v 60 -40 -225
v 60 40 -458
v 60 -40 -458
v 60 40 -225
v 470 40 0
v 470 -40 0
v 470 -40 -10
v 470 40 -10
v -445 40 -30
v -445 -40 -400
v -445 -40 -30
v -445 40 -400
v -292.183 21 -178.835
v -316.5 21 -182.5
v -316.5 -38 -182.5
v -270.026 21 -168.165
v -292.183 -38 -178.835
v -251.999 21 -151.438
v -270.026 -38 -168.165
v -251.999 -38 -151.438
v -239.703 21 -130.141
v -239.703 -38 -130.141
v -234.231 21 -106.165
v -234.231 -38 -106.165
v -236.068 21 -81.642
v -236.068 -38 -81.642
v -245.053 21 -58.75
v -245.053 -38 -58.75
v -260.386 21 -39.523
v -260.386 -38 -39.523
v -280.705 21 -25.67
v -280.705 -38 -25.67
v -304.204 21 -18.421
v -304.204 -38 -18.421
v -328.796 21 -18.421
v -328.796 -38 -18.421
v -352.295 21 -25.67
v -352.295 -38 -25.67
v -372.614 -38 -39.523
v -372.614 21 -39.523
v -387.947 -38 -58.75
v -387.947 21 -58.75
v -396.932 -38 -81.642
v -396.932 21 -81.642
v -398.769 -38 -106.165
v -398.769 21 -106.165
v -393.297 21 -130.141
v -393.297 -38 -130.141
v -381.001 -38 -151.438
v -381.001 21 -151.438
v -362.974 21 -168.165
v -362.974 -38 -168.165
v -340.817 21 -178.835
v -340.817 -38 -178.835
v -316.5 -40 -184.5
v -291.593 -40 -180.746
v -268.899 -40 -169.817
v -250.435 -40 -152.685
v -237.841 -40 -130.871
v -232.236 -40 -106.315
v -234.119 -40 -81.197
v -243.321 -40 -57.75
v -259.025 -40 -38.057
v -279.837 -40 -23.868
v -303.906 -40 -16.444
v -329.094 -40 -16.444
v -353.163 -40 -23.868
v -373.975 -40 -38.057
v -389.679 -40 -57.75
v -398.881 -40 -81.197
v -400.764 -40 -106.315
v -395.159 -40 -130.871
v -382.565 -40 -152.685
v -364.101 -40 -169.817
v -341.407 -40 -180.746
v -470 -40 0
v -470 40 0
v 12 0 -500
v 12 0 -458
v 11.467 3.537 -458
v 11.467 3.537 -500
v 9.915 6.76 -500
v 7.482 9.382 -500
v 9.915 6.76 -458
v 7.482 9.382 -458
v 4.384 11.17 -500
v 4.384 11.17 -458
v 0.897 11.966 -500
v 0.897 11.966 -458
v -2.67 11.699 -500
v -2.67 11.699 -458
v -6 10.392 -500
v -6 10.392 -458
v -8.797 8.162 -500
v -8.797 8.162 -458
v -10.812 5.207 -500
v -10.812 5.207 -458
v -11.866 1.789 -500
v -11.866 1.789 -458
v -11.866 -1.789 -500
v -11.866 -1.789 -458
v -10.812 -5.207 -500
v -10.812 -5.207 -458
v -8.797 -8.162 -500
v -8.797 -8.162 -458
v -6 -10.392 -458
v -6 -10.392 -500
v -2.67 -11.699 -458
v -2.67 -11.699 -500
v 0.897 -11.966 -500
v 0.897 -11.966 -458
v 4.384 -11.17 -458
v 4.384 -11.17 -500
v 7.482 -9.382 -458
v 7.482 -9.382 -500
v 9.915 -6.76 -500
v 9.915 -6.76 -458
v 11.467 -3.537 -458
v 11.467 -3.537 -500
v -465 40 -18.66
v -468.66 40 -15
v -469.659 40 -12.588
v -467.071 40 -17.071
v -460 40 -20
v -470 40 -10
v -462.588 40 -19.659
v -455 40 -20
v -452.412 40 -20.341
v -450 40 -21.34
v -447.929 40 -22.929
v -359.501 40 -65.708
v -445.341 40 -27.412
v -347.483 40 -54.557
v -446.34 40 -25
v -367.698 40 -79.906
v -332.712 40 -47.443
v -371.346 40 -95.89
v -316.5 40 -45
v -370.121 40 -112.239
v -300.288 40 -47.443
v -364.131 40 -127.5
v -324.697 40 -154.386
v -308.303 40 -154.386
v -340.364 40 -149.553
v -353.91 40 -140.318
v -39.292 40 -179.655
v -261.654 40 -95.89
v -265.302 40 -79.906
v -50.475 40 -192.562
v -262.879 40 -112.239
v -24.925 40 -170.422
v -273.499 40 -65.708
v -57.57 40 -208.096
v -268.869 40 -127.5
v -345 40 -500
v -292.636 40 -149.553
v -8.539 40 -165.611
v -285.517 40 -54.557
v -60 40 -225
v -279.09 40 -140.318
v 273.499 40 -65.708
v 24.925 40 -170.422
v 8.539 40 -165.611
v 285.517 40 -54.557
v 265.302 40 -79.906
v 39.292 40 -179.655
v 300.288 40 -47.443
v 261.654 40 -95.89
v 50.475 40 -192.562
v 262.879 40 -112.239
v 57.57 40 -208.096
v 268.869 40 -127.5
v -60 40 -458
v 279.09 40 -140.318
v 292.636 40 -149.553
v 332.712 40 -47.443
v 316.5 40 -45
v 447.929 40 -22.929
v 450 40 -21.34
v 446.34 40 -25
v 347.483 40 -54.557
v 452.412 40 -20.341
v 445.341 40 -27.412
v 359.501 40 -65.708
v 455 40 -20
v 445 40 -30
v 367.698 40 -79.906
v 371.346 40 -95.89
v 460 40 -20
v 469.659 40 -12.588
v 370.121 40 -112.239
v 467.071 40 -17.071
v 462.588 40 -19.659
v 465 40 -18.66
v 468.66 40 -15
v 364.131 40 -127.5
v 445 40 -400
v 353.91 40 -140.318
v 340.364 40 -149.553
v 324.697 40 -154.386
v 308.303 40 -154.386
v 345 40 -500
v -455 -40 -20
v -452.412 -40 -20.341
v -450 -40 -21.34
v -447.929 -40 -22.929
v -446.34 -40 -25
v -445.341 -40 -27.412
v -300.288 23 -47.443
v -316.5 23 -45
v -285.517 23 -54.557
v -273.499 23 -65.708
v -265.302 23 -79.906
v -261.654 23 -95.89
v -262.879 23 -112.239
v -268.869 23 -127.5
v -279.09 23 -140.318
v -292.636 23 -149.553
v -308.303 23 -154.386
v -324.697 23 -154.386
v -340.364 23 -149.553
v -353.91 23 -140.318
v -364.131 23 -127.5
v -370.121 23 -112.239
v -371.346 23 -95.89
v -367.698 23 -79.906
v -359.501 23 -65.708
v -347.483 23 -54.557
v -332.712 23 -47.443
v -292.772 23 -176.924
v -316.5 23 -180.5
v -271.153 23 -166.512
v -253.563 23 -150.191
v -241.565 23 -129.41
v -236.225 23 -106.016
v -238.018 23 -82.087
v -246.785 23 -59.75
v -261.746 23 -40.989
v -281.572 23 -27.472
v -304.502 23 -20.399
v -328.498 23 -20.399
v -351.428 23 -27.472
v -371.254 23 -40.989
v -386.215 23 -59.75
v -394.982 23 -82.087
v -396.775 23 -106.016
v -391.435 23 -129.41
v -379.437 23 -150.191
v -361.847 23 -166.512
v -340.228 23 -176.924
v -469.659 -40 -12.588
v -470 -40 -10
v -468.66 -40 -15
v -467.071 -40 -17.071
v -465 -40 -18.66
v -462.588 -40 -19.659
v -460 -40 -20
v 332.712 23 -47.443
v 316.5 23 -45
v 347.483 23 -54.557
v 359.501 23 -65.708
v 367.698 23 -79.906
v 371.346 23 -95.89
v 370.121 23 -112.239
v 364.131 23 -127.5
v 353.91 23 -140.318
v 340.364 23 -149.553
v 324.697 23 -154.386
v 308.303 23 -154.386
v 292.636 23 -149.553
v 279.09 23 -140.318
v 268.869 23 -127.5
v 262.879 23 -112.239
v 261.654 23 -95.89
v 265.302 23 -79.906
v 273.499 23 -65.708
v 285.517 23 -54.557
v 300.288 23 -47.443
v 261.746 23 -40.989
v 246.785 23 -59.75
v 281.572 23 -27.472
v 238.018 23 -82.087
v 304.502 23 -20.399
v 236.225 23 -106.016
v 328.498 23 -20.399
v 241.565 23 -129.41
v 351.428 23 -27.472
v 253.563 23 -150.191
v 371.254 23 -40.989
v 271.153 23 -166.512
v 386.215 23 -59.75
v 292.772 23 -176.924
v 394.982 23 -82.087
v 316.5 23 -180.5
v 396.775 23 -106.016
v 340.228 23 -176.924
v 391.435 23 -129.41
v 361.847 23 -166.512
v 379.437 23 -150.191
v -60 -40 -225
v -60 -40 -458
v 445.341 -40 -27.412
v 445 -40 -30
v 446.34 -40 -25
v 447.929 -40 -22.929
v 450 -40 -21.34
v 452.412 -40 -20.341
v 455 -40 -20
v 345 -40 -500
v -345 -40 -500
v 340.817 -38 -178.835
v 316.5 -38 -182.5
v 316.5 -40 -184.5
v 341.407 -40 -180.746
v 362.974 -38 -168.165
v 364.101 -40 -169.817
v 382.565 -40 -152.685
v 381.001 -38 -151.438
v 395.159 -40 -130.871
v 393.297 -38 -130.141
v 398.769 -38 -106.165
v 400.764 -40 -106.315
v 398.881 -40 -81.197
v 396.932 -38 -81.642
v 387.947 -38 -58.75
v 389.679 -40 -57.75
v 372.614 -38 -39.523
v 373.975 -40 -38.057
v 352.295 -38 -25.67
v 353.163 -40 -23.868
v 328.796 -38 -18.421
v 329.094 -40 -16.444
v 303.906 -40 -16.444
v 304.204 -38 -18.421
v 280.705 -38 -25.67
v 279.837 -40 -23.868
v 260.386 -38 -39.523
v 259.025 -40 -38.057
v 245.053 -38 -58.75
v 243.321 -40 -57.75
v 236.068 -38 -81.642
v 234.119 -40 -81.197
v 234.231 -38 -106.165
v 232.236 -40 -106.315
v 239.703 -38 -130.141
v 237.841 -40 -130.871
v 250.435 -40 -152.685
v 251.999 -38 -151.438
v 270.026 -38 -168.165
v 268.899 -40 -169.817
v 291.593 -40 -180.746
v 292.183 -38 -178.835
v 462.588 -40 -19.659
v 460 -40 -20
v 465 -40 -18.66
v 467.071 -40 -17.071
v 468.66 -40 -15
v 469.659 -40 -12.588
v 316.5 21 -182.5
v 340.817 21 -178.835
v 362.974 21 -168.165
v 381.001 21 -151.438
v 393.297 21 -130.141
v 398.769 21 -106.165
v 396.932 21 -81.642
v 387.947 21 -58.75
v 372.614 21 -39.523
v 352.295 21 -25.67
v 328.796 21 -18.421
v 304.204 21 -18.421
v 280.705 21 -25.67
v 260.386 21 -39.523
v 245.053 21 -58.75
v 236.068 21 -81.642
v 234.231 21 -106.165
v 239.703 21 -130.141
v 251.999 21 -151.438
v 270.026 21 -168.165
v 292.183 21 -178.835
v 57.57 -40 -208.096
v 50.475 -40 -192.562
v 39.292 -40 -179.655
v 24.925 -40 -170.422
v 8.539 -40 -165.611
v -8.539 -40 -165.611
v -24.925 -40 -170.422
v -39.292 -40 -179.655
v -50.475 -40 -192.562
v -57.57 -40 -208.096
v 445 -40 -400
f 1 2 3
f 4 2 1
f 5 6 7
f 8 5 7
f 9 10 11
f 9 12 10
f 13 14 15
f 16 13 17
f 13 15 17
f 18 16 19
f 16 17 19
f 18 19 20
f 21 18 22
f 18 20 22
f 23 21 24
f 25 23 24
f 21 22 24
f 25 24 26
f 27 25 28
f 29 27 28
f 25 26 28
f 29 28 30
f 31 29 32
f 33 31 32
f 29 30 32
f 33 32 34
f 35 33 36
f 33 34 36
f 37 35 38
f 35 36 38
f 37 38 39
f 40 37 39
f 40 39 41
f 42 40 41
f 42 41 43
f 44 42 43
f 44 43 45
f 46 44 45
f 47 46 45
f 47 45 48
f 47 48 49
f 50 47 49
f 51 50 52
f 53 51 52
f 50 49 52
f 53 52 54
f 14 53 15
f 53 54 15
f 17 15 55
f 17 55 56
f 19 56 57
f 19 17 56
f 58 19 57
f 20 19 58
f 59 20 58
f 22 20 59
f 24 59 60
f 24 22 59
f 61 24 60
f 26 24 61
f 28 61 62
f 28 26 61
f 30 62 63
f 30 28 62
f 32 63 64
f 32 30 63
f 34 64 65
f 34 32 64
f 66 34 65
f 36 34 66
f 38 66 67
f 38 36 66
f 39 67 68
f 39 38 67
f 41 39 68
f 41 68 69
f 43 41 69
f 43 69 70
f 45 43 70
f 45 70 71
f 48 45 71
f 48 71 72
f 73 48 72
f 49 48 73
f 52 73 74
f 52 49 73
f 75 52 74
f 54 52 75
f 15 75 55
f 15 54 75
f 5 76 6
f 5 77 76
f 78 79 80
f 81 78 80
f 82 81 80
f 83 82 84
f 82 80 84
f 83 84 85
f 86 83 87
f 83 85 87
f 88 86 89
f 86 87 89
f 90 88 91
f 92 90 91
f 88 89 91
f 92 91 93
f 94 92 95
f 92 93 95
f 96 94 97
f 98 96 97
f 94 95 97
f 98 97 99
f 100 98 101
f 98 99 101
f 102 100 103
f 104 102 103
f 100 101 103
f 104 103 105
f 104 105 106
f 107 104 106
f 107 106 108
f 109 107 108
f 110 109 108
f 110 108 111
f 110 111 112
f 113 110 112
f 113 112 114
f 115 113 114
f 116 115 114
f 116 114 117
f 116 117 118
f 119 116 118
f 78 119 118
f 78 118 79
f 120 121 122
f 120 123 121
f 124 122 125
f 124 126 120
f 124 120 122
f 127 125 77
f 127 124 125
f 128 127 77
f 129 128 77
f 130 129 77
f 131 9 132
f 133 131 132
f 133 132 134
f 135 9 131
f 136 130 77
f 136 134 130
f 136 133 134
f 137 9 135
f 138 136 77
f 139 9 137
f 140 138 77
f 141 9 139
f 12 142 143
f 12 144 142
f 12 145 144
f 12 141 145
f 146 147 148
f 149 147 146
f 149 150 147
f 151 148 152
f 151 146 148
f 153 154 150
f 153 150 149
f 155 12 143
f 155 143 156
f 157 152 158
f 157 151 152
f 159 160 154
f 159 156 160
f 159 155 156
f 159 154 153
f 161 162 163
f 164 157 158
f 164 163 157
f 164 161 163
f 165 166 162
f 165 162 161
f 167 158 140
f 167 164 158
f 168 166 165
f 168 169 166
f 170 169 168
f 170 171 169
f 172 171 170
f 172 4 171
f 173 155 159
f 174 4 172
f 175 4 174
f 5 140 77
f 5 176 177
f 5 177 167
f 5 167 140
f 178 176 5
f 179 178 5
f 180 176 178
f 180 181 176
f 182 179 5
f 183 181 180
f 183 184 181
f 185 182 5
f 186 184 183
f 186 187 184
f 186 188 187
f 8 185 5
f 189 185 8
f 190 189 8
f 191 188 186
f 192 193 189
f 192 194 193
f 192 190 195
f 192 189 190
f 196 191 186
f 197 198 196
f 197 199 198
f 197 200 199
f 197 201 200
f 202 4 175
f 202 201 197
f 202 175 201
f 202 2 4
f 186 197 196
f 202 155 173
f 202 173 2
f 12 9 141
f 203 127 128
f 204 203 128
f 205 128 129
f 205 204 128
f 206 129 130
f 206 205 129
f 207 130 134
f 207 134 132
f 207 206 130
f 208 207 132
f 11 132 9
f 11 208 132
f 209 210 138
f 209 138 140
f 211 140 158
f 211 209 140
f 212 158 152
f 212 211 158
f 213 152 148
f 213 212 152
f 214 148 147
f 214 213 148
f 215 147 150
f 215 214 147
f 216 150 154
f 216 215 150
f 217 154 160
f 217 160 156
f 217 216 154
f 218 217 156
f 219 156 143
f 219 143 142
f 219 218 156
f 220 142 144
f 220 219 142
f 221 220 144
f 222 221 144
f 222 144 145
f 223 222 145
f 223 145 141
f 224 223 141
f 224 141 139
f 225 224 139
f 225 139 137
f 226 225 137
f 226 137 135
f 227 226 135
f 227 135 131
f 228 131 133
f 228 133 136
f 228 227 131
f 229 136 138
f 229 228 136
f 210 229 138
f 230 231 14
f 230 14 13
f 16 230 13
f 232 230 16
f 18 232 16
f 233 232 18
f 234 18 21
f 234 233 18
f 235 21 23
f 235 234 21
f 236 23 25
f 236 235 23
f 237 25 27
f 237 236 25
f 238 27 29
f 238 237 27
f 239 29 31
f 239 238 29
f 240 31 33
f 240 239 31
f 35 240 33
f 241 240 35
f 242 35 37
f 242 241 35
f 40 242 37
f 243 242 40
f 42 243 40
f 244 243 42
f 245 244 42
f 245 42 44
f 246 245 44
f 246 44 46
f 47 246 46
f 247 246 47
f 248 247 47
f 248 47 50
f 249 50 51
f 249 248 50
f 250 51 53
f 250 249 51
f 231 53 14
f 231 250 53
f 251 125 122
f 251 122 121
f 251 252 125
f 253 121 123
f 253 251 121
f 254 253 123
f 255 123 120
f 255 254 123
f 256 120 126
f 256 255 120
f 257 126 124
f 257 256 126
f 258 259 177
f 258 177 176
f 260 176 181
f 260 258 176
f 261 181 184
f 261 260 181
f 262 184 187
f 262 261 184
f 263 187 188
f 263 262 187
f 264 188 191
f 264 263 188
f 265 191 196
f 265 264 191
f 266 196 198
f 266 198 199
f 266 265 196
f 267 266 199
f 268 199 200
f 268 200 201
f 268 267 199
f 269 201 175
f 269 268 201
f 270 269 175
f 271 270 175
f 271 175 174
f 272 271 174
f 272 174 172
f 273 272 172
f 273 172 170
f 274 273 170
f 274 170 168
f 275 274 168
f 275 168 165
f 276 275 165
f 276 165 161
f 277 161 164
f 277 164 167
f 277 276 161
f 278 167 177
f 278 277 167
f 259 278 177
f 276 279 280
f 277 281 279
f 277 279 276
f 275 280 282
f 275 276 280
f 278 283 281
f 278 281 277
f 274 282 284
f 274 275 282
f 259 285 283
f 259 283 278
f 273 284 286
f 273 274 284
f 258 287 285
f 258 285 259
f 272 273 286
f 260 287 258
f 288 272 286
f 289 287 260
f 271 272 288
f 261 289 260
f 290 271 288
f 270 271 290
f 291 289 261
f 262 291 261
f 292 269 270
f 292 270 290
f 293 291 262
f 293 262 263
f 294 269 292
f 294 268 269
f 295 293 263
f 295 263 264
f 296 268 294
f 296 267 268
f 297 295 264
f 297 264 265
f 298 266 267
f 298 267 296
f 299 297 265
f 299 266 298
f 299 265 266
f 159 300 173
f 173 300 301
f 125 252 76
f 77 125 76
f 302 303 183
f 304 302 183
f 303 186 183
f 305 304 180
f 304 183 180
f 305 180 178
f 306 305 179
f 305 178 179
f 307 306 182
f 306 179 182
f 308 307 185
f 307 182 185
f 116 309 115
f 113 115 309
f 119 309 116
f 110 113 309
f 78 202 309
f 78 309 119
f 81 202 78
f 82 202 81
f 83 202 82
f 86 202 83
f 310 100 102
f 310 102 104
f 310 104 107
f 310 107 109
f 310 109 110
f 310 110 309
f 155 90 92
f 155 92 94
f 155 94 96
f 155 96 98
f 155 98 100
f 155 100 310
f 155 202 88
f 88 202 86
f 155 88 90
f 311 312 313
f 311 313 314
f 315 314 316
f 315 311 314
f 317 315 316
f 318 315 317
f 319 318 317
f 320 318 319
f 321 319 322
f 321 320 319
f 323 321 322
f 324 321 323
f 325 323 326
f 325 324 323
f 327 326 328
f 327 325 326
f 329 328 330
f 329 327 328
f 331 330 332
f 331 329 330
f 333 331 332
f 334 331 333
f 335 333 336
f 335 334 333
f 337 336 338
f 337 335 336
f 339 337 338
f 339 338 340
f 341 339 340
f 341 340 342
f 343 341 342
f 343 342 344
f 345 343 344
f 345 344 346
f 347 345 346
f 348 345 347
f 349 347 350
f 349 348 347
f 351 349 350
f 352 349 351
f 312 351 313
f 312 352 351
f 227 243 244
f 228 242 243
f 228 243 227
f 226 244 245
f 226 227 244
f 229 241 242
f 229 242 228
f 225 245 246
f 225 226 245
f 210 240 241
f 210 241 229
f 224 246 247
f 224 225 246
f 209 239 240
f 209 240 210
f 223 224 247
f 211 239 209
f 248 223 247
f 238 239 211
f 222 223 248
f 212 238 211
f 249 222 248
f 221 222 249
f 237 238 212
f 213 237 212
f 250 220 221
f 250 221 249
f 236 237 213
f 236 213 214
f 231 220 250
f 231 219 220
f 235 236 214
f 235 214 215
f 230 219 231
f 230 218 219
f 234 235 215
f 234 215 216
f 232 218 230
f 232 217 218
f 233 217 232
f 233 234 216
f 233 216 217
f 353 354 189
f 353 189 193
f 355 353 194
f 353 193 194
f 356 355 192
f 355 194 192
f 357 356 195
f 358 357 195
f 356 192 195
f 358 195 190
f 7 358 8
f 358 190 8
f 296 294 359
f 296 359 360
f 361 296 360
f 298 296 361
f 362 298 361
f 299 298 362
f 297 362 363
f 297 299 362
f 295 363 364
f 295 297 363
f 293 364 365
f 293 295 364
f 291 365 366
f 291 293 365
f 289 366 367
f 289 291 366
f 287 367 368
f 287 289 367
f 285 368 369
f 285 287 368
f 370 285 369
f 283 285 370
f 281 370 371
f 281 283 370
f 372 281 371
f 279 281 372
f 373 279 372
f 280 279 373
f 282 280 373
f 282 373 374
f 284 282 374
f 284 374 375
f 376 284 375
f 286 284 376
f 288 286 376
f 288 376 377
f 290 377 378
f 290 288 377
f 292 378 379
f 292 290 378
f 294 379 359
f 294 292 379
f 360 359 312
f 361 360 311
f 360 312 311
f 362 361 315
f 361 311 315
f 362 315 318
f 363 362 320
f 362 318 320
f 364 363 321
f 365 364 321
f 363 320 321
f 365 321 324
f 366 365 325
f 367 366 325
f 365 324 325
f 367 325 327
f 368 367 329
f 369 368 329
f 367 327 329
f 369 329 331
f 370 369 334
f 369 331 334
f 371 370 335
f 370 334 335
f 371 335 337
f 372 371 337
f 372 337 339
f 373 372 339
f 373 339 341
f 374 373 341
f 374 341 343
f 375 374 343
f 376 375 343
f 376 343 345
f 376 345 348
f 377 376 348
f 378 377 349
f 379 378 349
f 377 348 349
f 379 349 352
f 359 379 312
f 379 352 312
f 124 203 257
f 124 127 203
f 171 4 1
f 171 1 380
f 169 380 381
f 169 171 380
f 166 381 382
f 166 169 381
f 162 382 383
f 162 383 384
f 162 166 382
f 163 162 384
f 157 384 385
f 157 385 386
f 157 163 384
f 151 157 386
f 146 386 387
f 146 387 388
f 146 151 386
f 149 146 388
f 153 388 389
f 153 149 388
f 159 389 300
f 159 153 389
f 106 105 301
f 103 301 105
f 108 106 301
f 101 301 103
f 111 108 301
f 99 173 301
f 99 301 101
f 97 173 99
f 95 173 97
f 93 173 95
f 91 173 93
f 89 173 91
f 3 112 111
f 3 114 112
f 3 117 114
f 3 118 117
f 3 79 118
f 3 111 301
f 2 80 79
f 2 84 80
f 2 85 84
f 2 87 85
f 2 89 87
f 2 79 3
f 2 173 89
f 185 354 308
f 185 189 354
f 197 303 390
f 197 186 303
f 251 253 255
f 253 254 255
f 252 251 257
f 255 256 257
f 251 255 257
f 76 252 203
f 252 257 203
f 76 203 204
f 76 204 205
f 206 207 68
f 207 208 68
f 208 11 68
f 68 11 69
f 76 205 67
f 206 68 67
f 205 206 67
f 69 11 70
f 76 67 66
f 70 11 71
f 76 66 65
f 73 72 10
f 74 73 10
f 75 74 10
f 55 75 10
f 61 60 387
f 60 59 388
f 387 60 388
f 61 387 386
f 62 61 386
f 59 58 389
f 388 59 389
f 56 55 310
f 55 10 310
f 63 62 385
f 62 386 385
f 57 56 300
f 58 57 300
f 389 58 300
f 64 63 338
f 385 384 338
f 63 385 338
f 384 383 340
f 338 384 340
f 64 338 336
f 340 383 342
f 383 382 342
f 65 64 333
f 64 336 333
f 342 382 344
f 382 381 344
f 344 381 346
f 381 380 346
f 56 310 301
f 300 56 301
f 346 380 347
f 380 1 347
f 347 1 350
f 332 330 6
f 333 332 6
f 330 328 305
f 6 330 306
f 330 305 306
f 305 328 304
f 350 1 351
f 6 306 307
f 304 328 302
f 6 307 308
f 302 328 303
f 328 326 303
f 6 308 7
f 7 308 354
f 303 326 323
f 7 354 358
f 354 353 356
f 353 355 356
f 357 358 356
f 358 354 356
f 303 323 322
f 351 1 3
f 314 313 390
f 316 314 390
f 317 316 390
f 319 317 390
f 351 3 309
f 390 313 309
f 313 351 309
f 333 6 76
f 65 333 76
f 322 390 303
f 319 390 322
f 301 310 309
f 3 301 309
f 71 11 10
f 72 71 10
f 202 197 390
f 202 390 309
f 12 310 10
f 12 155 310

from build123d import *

# Parameters (mm, degrees)
SKETCH1_R           = 55
BOSS_EXTRUDE1_DEPTH = 40
FILLET1_R           = 10
SKETCH2_R           = 12
CUT_EXTRUDE1_DEPTH  = 80
SKETCH3_R           = 82.5
CUT_EXTRUDE2_DEPTH  = 63
CHAMFER1_SIZE       = 2


with BuildPart() as part:
    # Sketch1 → Boss-Extrude1 (new, symmetric)
    with BuildSketch(Plane(origin=(0, 0, 0), x_dir=(1, 0, 0), z_dir=(0, 1, 0))):
        Polygon((-470, 0), (-445, 0), (445, 0), (470, 0), (470, 20), (445, 20), (445, 400), (345, 500), (-345, 500), (-445, 400), (-445, 20), (-470, 20), align=None)
        with Locations(Location((-316.5, 100, 0), (0, 0, 270))):
            Circle(SKETCH1_R, mode=Mode.SUBTRACT)
        with Locations(Location((316.5, 100, 0), (0, 0, 270))):
            Circle(SKETCH1_R, mode=Mode.SUBTRACT)
        with BuildLine():
            Line((-60, 225), (-60, 458))
            Line((-60, 458), (60, 458))
            Line((60, 458), (60, 225))
            ThreePointArc((60, 225), (0, 165), (-60, 225))
        make_face(mode=Mode.SUBTRACT)
    extrude(amount=BOSS_EXTRUDE1_DEPTH, both=True)

    # Fillet1
    fillet1_edges = [part.edges().sort_by_distance(p)[0] for p in [
        (445, 0, -20),
        (470, 0, -20),
        (-470, 0, -20),
        (-445, 0, -20),
    ]]
    fillet(fillet1_edges, radius=FILLET1_R)

    # Sketch2 → Cut-Extrude1 (cut)
    with BuildSketch(Plane.XY.offset(-458)):
        Circle(SKETCH2_R)
    extrude(amount=-CUT_EXTRUDE1_DEPTH, mode=Mode.SUBTRACT)

    # Sketch3 → Cut-Extrude2 (cut)
    with BuildSketch(Plane.XZ.offset(40)):
        with Locations(Location((-316.5, -100, 0), (0, 0, 270))):
            Circle(SKETCH3_R)
        with Locations(Location((316.5, -100, 0), (0, 0, 270))):
            Circle(SKETCH3_R)
    extrude(amount=-CUT_EXTRUDE2_DEPTH, mode=Mode.SUBTRACT)

    # Chamfer1
    chamfer1_edges = [part.edges().sort_by_distance(p)[0] for p in [
        (-316.5, 23, -17.5),
        (-316.5, -40, -17.5),
        (316.5, -40, -17.5),
        (316.5, 23, -17.5),
    ]]
    chamfer(chamfer1_edges, length=CHAMFER1_SIZE)


solid = part.part
